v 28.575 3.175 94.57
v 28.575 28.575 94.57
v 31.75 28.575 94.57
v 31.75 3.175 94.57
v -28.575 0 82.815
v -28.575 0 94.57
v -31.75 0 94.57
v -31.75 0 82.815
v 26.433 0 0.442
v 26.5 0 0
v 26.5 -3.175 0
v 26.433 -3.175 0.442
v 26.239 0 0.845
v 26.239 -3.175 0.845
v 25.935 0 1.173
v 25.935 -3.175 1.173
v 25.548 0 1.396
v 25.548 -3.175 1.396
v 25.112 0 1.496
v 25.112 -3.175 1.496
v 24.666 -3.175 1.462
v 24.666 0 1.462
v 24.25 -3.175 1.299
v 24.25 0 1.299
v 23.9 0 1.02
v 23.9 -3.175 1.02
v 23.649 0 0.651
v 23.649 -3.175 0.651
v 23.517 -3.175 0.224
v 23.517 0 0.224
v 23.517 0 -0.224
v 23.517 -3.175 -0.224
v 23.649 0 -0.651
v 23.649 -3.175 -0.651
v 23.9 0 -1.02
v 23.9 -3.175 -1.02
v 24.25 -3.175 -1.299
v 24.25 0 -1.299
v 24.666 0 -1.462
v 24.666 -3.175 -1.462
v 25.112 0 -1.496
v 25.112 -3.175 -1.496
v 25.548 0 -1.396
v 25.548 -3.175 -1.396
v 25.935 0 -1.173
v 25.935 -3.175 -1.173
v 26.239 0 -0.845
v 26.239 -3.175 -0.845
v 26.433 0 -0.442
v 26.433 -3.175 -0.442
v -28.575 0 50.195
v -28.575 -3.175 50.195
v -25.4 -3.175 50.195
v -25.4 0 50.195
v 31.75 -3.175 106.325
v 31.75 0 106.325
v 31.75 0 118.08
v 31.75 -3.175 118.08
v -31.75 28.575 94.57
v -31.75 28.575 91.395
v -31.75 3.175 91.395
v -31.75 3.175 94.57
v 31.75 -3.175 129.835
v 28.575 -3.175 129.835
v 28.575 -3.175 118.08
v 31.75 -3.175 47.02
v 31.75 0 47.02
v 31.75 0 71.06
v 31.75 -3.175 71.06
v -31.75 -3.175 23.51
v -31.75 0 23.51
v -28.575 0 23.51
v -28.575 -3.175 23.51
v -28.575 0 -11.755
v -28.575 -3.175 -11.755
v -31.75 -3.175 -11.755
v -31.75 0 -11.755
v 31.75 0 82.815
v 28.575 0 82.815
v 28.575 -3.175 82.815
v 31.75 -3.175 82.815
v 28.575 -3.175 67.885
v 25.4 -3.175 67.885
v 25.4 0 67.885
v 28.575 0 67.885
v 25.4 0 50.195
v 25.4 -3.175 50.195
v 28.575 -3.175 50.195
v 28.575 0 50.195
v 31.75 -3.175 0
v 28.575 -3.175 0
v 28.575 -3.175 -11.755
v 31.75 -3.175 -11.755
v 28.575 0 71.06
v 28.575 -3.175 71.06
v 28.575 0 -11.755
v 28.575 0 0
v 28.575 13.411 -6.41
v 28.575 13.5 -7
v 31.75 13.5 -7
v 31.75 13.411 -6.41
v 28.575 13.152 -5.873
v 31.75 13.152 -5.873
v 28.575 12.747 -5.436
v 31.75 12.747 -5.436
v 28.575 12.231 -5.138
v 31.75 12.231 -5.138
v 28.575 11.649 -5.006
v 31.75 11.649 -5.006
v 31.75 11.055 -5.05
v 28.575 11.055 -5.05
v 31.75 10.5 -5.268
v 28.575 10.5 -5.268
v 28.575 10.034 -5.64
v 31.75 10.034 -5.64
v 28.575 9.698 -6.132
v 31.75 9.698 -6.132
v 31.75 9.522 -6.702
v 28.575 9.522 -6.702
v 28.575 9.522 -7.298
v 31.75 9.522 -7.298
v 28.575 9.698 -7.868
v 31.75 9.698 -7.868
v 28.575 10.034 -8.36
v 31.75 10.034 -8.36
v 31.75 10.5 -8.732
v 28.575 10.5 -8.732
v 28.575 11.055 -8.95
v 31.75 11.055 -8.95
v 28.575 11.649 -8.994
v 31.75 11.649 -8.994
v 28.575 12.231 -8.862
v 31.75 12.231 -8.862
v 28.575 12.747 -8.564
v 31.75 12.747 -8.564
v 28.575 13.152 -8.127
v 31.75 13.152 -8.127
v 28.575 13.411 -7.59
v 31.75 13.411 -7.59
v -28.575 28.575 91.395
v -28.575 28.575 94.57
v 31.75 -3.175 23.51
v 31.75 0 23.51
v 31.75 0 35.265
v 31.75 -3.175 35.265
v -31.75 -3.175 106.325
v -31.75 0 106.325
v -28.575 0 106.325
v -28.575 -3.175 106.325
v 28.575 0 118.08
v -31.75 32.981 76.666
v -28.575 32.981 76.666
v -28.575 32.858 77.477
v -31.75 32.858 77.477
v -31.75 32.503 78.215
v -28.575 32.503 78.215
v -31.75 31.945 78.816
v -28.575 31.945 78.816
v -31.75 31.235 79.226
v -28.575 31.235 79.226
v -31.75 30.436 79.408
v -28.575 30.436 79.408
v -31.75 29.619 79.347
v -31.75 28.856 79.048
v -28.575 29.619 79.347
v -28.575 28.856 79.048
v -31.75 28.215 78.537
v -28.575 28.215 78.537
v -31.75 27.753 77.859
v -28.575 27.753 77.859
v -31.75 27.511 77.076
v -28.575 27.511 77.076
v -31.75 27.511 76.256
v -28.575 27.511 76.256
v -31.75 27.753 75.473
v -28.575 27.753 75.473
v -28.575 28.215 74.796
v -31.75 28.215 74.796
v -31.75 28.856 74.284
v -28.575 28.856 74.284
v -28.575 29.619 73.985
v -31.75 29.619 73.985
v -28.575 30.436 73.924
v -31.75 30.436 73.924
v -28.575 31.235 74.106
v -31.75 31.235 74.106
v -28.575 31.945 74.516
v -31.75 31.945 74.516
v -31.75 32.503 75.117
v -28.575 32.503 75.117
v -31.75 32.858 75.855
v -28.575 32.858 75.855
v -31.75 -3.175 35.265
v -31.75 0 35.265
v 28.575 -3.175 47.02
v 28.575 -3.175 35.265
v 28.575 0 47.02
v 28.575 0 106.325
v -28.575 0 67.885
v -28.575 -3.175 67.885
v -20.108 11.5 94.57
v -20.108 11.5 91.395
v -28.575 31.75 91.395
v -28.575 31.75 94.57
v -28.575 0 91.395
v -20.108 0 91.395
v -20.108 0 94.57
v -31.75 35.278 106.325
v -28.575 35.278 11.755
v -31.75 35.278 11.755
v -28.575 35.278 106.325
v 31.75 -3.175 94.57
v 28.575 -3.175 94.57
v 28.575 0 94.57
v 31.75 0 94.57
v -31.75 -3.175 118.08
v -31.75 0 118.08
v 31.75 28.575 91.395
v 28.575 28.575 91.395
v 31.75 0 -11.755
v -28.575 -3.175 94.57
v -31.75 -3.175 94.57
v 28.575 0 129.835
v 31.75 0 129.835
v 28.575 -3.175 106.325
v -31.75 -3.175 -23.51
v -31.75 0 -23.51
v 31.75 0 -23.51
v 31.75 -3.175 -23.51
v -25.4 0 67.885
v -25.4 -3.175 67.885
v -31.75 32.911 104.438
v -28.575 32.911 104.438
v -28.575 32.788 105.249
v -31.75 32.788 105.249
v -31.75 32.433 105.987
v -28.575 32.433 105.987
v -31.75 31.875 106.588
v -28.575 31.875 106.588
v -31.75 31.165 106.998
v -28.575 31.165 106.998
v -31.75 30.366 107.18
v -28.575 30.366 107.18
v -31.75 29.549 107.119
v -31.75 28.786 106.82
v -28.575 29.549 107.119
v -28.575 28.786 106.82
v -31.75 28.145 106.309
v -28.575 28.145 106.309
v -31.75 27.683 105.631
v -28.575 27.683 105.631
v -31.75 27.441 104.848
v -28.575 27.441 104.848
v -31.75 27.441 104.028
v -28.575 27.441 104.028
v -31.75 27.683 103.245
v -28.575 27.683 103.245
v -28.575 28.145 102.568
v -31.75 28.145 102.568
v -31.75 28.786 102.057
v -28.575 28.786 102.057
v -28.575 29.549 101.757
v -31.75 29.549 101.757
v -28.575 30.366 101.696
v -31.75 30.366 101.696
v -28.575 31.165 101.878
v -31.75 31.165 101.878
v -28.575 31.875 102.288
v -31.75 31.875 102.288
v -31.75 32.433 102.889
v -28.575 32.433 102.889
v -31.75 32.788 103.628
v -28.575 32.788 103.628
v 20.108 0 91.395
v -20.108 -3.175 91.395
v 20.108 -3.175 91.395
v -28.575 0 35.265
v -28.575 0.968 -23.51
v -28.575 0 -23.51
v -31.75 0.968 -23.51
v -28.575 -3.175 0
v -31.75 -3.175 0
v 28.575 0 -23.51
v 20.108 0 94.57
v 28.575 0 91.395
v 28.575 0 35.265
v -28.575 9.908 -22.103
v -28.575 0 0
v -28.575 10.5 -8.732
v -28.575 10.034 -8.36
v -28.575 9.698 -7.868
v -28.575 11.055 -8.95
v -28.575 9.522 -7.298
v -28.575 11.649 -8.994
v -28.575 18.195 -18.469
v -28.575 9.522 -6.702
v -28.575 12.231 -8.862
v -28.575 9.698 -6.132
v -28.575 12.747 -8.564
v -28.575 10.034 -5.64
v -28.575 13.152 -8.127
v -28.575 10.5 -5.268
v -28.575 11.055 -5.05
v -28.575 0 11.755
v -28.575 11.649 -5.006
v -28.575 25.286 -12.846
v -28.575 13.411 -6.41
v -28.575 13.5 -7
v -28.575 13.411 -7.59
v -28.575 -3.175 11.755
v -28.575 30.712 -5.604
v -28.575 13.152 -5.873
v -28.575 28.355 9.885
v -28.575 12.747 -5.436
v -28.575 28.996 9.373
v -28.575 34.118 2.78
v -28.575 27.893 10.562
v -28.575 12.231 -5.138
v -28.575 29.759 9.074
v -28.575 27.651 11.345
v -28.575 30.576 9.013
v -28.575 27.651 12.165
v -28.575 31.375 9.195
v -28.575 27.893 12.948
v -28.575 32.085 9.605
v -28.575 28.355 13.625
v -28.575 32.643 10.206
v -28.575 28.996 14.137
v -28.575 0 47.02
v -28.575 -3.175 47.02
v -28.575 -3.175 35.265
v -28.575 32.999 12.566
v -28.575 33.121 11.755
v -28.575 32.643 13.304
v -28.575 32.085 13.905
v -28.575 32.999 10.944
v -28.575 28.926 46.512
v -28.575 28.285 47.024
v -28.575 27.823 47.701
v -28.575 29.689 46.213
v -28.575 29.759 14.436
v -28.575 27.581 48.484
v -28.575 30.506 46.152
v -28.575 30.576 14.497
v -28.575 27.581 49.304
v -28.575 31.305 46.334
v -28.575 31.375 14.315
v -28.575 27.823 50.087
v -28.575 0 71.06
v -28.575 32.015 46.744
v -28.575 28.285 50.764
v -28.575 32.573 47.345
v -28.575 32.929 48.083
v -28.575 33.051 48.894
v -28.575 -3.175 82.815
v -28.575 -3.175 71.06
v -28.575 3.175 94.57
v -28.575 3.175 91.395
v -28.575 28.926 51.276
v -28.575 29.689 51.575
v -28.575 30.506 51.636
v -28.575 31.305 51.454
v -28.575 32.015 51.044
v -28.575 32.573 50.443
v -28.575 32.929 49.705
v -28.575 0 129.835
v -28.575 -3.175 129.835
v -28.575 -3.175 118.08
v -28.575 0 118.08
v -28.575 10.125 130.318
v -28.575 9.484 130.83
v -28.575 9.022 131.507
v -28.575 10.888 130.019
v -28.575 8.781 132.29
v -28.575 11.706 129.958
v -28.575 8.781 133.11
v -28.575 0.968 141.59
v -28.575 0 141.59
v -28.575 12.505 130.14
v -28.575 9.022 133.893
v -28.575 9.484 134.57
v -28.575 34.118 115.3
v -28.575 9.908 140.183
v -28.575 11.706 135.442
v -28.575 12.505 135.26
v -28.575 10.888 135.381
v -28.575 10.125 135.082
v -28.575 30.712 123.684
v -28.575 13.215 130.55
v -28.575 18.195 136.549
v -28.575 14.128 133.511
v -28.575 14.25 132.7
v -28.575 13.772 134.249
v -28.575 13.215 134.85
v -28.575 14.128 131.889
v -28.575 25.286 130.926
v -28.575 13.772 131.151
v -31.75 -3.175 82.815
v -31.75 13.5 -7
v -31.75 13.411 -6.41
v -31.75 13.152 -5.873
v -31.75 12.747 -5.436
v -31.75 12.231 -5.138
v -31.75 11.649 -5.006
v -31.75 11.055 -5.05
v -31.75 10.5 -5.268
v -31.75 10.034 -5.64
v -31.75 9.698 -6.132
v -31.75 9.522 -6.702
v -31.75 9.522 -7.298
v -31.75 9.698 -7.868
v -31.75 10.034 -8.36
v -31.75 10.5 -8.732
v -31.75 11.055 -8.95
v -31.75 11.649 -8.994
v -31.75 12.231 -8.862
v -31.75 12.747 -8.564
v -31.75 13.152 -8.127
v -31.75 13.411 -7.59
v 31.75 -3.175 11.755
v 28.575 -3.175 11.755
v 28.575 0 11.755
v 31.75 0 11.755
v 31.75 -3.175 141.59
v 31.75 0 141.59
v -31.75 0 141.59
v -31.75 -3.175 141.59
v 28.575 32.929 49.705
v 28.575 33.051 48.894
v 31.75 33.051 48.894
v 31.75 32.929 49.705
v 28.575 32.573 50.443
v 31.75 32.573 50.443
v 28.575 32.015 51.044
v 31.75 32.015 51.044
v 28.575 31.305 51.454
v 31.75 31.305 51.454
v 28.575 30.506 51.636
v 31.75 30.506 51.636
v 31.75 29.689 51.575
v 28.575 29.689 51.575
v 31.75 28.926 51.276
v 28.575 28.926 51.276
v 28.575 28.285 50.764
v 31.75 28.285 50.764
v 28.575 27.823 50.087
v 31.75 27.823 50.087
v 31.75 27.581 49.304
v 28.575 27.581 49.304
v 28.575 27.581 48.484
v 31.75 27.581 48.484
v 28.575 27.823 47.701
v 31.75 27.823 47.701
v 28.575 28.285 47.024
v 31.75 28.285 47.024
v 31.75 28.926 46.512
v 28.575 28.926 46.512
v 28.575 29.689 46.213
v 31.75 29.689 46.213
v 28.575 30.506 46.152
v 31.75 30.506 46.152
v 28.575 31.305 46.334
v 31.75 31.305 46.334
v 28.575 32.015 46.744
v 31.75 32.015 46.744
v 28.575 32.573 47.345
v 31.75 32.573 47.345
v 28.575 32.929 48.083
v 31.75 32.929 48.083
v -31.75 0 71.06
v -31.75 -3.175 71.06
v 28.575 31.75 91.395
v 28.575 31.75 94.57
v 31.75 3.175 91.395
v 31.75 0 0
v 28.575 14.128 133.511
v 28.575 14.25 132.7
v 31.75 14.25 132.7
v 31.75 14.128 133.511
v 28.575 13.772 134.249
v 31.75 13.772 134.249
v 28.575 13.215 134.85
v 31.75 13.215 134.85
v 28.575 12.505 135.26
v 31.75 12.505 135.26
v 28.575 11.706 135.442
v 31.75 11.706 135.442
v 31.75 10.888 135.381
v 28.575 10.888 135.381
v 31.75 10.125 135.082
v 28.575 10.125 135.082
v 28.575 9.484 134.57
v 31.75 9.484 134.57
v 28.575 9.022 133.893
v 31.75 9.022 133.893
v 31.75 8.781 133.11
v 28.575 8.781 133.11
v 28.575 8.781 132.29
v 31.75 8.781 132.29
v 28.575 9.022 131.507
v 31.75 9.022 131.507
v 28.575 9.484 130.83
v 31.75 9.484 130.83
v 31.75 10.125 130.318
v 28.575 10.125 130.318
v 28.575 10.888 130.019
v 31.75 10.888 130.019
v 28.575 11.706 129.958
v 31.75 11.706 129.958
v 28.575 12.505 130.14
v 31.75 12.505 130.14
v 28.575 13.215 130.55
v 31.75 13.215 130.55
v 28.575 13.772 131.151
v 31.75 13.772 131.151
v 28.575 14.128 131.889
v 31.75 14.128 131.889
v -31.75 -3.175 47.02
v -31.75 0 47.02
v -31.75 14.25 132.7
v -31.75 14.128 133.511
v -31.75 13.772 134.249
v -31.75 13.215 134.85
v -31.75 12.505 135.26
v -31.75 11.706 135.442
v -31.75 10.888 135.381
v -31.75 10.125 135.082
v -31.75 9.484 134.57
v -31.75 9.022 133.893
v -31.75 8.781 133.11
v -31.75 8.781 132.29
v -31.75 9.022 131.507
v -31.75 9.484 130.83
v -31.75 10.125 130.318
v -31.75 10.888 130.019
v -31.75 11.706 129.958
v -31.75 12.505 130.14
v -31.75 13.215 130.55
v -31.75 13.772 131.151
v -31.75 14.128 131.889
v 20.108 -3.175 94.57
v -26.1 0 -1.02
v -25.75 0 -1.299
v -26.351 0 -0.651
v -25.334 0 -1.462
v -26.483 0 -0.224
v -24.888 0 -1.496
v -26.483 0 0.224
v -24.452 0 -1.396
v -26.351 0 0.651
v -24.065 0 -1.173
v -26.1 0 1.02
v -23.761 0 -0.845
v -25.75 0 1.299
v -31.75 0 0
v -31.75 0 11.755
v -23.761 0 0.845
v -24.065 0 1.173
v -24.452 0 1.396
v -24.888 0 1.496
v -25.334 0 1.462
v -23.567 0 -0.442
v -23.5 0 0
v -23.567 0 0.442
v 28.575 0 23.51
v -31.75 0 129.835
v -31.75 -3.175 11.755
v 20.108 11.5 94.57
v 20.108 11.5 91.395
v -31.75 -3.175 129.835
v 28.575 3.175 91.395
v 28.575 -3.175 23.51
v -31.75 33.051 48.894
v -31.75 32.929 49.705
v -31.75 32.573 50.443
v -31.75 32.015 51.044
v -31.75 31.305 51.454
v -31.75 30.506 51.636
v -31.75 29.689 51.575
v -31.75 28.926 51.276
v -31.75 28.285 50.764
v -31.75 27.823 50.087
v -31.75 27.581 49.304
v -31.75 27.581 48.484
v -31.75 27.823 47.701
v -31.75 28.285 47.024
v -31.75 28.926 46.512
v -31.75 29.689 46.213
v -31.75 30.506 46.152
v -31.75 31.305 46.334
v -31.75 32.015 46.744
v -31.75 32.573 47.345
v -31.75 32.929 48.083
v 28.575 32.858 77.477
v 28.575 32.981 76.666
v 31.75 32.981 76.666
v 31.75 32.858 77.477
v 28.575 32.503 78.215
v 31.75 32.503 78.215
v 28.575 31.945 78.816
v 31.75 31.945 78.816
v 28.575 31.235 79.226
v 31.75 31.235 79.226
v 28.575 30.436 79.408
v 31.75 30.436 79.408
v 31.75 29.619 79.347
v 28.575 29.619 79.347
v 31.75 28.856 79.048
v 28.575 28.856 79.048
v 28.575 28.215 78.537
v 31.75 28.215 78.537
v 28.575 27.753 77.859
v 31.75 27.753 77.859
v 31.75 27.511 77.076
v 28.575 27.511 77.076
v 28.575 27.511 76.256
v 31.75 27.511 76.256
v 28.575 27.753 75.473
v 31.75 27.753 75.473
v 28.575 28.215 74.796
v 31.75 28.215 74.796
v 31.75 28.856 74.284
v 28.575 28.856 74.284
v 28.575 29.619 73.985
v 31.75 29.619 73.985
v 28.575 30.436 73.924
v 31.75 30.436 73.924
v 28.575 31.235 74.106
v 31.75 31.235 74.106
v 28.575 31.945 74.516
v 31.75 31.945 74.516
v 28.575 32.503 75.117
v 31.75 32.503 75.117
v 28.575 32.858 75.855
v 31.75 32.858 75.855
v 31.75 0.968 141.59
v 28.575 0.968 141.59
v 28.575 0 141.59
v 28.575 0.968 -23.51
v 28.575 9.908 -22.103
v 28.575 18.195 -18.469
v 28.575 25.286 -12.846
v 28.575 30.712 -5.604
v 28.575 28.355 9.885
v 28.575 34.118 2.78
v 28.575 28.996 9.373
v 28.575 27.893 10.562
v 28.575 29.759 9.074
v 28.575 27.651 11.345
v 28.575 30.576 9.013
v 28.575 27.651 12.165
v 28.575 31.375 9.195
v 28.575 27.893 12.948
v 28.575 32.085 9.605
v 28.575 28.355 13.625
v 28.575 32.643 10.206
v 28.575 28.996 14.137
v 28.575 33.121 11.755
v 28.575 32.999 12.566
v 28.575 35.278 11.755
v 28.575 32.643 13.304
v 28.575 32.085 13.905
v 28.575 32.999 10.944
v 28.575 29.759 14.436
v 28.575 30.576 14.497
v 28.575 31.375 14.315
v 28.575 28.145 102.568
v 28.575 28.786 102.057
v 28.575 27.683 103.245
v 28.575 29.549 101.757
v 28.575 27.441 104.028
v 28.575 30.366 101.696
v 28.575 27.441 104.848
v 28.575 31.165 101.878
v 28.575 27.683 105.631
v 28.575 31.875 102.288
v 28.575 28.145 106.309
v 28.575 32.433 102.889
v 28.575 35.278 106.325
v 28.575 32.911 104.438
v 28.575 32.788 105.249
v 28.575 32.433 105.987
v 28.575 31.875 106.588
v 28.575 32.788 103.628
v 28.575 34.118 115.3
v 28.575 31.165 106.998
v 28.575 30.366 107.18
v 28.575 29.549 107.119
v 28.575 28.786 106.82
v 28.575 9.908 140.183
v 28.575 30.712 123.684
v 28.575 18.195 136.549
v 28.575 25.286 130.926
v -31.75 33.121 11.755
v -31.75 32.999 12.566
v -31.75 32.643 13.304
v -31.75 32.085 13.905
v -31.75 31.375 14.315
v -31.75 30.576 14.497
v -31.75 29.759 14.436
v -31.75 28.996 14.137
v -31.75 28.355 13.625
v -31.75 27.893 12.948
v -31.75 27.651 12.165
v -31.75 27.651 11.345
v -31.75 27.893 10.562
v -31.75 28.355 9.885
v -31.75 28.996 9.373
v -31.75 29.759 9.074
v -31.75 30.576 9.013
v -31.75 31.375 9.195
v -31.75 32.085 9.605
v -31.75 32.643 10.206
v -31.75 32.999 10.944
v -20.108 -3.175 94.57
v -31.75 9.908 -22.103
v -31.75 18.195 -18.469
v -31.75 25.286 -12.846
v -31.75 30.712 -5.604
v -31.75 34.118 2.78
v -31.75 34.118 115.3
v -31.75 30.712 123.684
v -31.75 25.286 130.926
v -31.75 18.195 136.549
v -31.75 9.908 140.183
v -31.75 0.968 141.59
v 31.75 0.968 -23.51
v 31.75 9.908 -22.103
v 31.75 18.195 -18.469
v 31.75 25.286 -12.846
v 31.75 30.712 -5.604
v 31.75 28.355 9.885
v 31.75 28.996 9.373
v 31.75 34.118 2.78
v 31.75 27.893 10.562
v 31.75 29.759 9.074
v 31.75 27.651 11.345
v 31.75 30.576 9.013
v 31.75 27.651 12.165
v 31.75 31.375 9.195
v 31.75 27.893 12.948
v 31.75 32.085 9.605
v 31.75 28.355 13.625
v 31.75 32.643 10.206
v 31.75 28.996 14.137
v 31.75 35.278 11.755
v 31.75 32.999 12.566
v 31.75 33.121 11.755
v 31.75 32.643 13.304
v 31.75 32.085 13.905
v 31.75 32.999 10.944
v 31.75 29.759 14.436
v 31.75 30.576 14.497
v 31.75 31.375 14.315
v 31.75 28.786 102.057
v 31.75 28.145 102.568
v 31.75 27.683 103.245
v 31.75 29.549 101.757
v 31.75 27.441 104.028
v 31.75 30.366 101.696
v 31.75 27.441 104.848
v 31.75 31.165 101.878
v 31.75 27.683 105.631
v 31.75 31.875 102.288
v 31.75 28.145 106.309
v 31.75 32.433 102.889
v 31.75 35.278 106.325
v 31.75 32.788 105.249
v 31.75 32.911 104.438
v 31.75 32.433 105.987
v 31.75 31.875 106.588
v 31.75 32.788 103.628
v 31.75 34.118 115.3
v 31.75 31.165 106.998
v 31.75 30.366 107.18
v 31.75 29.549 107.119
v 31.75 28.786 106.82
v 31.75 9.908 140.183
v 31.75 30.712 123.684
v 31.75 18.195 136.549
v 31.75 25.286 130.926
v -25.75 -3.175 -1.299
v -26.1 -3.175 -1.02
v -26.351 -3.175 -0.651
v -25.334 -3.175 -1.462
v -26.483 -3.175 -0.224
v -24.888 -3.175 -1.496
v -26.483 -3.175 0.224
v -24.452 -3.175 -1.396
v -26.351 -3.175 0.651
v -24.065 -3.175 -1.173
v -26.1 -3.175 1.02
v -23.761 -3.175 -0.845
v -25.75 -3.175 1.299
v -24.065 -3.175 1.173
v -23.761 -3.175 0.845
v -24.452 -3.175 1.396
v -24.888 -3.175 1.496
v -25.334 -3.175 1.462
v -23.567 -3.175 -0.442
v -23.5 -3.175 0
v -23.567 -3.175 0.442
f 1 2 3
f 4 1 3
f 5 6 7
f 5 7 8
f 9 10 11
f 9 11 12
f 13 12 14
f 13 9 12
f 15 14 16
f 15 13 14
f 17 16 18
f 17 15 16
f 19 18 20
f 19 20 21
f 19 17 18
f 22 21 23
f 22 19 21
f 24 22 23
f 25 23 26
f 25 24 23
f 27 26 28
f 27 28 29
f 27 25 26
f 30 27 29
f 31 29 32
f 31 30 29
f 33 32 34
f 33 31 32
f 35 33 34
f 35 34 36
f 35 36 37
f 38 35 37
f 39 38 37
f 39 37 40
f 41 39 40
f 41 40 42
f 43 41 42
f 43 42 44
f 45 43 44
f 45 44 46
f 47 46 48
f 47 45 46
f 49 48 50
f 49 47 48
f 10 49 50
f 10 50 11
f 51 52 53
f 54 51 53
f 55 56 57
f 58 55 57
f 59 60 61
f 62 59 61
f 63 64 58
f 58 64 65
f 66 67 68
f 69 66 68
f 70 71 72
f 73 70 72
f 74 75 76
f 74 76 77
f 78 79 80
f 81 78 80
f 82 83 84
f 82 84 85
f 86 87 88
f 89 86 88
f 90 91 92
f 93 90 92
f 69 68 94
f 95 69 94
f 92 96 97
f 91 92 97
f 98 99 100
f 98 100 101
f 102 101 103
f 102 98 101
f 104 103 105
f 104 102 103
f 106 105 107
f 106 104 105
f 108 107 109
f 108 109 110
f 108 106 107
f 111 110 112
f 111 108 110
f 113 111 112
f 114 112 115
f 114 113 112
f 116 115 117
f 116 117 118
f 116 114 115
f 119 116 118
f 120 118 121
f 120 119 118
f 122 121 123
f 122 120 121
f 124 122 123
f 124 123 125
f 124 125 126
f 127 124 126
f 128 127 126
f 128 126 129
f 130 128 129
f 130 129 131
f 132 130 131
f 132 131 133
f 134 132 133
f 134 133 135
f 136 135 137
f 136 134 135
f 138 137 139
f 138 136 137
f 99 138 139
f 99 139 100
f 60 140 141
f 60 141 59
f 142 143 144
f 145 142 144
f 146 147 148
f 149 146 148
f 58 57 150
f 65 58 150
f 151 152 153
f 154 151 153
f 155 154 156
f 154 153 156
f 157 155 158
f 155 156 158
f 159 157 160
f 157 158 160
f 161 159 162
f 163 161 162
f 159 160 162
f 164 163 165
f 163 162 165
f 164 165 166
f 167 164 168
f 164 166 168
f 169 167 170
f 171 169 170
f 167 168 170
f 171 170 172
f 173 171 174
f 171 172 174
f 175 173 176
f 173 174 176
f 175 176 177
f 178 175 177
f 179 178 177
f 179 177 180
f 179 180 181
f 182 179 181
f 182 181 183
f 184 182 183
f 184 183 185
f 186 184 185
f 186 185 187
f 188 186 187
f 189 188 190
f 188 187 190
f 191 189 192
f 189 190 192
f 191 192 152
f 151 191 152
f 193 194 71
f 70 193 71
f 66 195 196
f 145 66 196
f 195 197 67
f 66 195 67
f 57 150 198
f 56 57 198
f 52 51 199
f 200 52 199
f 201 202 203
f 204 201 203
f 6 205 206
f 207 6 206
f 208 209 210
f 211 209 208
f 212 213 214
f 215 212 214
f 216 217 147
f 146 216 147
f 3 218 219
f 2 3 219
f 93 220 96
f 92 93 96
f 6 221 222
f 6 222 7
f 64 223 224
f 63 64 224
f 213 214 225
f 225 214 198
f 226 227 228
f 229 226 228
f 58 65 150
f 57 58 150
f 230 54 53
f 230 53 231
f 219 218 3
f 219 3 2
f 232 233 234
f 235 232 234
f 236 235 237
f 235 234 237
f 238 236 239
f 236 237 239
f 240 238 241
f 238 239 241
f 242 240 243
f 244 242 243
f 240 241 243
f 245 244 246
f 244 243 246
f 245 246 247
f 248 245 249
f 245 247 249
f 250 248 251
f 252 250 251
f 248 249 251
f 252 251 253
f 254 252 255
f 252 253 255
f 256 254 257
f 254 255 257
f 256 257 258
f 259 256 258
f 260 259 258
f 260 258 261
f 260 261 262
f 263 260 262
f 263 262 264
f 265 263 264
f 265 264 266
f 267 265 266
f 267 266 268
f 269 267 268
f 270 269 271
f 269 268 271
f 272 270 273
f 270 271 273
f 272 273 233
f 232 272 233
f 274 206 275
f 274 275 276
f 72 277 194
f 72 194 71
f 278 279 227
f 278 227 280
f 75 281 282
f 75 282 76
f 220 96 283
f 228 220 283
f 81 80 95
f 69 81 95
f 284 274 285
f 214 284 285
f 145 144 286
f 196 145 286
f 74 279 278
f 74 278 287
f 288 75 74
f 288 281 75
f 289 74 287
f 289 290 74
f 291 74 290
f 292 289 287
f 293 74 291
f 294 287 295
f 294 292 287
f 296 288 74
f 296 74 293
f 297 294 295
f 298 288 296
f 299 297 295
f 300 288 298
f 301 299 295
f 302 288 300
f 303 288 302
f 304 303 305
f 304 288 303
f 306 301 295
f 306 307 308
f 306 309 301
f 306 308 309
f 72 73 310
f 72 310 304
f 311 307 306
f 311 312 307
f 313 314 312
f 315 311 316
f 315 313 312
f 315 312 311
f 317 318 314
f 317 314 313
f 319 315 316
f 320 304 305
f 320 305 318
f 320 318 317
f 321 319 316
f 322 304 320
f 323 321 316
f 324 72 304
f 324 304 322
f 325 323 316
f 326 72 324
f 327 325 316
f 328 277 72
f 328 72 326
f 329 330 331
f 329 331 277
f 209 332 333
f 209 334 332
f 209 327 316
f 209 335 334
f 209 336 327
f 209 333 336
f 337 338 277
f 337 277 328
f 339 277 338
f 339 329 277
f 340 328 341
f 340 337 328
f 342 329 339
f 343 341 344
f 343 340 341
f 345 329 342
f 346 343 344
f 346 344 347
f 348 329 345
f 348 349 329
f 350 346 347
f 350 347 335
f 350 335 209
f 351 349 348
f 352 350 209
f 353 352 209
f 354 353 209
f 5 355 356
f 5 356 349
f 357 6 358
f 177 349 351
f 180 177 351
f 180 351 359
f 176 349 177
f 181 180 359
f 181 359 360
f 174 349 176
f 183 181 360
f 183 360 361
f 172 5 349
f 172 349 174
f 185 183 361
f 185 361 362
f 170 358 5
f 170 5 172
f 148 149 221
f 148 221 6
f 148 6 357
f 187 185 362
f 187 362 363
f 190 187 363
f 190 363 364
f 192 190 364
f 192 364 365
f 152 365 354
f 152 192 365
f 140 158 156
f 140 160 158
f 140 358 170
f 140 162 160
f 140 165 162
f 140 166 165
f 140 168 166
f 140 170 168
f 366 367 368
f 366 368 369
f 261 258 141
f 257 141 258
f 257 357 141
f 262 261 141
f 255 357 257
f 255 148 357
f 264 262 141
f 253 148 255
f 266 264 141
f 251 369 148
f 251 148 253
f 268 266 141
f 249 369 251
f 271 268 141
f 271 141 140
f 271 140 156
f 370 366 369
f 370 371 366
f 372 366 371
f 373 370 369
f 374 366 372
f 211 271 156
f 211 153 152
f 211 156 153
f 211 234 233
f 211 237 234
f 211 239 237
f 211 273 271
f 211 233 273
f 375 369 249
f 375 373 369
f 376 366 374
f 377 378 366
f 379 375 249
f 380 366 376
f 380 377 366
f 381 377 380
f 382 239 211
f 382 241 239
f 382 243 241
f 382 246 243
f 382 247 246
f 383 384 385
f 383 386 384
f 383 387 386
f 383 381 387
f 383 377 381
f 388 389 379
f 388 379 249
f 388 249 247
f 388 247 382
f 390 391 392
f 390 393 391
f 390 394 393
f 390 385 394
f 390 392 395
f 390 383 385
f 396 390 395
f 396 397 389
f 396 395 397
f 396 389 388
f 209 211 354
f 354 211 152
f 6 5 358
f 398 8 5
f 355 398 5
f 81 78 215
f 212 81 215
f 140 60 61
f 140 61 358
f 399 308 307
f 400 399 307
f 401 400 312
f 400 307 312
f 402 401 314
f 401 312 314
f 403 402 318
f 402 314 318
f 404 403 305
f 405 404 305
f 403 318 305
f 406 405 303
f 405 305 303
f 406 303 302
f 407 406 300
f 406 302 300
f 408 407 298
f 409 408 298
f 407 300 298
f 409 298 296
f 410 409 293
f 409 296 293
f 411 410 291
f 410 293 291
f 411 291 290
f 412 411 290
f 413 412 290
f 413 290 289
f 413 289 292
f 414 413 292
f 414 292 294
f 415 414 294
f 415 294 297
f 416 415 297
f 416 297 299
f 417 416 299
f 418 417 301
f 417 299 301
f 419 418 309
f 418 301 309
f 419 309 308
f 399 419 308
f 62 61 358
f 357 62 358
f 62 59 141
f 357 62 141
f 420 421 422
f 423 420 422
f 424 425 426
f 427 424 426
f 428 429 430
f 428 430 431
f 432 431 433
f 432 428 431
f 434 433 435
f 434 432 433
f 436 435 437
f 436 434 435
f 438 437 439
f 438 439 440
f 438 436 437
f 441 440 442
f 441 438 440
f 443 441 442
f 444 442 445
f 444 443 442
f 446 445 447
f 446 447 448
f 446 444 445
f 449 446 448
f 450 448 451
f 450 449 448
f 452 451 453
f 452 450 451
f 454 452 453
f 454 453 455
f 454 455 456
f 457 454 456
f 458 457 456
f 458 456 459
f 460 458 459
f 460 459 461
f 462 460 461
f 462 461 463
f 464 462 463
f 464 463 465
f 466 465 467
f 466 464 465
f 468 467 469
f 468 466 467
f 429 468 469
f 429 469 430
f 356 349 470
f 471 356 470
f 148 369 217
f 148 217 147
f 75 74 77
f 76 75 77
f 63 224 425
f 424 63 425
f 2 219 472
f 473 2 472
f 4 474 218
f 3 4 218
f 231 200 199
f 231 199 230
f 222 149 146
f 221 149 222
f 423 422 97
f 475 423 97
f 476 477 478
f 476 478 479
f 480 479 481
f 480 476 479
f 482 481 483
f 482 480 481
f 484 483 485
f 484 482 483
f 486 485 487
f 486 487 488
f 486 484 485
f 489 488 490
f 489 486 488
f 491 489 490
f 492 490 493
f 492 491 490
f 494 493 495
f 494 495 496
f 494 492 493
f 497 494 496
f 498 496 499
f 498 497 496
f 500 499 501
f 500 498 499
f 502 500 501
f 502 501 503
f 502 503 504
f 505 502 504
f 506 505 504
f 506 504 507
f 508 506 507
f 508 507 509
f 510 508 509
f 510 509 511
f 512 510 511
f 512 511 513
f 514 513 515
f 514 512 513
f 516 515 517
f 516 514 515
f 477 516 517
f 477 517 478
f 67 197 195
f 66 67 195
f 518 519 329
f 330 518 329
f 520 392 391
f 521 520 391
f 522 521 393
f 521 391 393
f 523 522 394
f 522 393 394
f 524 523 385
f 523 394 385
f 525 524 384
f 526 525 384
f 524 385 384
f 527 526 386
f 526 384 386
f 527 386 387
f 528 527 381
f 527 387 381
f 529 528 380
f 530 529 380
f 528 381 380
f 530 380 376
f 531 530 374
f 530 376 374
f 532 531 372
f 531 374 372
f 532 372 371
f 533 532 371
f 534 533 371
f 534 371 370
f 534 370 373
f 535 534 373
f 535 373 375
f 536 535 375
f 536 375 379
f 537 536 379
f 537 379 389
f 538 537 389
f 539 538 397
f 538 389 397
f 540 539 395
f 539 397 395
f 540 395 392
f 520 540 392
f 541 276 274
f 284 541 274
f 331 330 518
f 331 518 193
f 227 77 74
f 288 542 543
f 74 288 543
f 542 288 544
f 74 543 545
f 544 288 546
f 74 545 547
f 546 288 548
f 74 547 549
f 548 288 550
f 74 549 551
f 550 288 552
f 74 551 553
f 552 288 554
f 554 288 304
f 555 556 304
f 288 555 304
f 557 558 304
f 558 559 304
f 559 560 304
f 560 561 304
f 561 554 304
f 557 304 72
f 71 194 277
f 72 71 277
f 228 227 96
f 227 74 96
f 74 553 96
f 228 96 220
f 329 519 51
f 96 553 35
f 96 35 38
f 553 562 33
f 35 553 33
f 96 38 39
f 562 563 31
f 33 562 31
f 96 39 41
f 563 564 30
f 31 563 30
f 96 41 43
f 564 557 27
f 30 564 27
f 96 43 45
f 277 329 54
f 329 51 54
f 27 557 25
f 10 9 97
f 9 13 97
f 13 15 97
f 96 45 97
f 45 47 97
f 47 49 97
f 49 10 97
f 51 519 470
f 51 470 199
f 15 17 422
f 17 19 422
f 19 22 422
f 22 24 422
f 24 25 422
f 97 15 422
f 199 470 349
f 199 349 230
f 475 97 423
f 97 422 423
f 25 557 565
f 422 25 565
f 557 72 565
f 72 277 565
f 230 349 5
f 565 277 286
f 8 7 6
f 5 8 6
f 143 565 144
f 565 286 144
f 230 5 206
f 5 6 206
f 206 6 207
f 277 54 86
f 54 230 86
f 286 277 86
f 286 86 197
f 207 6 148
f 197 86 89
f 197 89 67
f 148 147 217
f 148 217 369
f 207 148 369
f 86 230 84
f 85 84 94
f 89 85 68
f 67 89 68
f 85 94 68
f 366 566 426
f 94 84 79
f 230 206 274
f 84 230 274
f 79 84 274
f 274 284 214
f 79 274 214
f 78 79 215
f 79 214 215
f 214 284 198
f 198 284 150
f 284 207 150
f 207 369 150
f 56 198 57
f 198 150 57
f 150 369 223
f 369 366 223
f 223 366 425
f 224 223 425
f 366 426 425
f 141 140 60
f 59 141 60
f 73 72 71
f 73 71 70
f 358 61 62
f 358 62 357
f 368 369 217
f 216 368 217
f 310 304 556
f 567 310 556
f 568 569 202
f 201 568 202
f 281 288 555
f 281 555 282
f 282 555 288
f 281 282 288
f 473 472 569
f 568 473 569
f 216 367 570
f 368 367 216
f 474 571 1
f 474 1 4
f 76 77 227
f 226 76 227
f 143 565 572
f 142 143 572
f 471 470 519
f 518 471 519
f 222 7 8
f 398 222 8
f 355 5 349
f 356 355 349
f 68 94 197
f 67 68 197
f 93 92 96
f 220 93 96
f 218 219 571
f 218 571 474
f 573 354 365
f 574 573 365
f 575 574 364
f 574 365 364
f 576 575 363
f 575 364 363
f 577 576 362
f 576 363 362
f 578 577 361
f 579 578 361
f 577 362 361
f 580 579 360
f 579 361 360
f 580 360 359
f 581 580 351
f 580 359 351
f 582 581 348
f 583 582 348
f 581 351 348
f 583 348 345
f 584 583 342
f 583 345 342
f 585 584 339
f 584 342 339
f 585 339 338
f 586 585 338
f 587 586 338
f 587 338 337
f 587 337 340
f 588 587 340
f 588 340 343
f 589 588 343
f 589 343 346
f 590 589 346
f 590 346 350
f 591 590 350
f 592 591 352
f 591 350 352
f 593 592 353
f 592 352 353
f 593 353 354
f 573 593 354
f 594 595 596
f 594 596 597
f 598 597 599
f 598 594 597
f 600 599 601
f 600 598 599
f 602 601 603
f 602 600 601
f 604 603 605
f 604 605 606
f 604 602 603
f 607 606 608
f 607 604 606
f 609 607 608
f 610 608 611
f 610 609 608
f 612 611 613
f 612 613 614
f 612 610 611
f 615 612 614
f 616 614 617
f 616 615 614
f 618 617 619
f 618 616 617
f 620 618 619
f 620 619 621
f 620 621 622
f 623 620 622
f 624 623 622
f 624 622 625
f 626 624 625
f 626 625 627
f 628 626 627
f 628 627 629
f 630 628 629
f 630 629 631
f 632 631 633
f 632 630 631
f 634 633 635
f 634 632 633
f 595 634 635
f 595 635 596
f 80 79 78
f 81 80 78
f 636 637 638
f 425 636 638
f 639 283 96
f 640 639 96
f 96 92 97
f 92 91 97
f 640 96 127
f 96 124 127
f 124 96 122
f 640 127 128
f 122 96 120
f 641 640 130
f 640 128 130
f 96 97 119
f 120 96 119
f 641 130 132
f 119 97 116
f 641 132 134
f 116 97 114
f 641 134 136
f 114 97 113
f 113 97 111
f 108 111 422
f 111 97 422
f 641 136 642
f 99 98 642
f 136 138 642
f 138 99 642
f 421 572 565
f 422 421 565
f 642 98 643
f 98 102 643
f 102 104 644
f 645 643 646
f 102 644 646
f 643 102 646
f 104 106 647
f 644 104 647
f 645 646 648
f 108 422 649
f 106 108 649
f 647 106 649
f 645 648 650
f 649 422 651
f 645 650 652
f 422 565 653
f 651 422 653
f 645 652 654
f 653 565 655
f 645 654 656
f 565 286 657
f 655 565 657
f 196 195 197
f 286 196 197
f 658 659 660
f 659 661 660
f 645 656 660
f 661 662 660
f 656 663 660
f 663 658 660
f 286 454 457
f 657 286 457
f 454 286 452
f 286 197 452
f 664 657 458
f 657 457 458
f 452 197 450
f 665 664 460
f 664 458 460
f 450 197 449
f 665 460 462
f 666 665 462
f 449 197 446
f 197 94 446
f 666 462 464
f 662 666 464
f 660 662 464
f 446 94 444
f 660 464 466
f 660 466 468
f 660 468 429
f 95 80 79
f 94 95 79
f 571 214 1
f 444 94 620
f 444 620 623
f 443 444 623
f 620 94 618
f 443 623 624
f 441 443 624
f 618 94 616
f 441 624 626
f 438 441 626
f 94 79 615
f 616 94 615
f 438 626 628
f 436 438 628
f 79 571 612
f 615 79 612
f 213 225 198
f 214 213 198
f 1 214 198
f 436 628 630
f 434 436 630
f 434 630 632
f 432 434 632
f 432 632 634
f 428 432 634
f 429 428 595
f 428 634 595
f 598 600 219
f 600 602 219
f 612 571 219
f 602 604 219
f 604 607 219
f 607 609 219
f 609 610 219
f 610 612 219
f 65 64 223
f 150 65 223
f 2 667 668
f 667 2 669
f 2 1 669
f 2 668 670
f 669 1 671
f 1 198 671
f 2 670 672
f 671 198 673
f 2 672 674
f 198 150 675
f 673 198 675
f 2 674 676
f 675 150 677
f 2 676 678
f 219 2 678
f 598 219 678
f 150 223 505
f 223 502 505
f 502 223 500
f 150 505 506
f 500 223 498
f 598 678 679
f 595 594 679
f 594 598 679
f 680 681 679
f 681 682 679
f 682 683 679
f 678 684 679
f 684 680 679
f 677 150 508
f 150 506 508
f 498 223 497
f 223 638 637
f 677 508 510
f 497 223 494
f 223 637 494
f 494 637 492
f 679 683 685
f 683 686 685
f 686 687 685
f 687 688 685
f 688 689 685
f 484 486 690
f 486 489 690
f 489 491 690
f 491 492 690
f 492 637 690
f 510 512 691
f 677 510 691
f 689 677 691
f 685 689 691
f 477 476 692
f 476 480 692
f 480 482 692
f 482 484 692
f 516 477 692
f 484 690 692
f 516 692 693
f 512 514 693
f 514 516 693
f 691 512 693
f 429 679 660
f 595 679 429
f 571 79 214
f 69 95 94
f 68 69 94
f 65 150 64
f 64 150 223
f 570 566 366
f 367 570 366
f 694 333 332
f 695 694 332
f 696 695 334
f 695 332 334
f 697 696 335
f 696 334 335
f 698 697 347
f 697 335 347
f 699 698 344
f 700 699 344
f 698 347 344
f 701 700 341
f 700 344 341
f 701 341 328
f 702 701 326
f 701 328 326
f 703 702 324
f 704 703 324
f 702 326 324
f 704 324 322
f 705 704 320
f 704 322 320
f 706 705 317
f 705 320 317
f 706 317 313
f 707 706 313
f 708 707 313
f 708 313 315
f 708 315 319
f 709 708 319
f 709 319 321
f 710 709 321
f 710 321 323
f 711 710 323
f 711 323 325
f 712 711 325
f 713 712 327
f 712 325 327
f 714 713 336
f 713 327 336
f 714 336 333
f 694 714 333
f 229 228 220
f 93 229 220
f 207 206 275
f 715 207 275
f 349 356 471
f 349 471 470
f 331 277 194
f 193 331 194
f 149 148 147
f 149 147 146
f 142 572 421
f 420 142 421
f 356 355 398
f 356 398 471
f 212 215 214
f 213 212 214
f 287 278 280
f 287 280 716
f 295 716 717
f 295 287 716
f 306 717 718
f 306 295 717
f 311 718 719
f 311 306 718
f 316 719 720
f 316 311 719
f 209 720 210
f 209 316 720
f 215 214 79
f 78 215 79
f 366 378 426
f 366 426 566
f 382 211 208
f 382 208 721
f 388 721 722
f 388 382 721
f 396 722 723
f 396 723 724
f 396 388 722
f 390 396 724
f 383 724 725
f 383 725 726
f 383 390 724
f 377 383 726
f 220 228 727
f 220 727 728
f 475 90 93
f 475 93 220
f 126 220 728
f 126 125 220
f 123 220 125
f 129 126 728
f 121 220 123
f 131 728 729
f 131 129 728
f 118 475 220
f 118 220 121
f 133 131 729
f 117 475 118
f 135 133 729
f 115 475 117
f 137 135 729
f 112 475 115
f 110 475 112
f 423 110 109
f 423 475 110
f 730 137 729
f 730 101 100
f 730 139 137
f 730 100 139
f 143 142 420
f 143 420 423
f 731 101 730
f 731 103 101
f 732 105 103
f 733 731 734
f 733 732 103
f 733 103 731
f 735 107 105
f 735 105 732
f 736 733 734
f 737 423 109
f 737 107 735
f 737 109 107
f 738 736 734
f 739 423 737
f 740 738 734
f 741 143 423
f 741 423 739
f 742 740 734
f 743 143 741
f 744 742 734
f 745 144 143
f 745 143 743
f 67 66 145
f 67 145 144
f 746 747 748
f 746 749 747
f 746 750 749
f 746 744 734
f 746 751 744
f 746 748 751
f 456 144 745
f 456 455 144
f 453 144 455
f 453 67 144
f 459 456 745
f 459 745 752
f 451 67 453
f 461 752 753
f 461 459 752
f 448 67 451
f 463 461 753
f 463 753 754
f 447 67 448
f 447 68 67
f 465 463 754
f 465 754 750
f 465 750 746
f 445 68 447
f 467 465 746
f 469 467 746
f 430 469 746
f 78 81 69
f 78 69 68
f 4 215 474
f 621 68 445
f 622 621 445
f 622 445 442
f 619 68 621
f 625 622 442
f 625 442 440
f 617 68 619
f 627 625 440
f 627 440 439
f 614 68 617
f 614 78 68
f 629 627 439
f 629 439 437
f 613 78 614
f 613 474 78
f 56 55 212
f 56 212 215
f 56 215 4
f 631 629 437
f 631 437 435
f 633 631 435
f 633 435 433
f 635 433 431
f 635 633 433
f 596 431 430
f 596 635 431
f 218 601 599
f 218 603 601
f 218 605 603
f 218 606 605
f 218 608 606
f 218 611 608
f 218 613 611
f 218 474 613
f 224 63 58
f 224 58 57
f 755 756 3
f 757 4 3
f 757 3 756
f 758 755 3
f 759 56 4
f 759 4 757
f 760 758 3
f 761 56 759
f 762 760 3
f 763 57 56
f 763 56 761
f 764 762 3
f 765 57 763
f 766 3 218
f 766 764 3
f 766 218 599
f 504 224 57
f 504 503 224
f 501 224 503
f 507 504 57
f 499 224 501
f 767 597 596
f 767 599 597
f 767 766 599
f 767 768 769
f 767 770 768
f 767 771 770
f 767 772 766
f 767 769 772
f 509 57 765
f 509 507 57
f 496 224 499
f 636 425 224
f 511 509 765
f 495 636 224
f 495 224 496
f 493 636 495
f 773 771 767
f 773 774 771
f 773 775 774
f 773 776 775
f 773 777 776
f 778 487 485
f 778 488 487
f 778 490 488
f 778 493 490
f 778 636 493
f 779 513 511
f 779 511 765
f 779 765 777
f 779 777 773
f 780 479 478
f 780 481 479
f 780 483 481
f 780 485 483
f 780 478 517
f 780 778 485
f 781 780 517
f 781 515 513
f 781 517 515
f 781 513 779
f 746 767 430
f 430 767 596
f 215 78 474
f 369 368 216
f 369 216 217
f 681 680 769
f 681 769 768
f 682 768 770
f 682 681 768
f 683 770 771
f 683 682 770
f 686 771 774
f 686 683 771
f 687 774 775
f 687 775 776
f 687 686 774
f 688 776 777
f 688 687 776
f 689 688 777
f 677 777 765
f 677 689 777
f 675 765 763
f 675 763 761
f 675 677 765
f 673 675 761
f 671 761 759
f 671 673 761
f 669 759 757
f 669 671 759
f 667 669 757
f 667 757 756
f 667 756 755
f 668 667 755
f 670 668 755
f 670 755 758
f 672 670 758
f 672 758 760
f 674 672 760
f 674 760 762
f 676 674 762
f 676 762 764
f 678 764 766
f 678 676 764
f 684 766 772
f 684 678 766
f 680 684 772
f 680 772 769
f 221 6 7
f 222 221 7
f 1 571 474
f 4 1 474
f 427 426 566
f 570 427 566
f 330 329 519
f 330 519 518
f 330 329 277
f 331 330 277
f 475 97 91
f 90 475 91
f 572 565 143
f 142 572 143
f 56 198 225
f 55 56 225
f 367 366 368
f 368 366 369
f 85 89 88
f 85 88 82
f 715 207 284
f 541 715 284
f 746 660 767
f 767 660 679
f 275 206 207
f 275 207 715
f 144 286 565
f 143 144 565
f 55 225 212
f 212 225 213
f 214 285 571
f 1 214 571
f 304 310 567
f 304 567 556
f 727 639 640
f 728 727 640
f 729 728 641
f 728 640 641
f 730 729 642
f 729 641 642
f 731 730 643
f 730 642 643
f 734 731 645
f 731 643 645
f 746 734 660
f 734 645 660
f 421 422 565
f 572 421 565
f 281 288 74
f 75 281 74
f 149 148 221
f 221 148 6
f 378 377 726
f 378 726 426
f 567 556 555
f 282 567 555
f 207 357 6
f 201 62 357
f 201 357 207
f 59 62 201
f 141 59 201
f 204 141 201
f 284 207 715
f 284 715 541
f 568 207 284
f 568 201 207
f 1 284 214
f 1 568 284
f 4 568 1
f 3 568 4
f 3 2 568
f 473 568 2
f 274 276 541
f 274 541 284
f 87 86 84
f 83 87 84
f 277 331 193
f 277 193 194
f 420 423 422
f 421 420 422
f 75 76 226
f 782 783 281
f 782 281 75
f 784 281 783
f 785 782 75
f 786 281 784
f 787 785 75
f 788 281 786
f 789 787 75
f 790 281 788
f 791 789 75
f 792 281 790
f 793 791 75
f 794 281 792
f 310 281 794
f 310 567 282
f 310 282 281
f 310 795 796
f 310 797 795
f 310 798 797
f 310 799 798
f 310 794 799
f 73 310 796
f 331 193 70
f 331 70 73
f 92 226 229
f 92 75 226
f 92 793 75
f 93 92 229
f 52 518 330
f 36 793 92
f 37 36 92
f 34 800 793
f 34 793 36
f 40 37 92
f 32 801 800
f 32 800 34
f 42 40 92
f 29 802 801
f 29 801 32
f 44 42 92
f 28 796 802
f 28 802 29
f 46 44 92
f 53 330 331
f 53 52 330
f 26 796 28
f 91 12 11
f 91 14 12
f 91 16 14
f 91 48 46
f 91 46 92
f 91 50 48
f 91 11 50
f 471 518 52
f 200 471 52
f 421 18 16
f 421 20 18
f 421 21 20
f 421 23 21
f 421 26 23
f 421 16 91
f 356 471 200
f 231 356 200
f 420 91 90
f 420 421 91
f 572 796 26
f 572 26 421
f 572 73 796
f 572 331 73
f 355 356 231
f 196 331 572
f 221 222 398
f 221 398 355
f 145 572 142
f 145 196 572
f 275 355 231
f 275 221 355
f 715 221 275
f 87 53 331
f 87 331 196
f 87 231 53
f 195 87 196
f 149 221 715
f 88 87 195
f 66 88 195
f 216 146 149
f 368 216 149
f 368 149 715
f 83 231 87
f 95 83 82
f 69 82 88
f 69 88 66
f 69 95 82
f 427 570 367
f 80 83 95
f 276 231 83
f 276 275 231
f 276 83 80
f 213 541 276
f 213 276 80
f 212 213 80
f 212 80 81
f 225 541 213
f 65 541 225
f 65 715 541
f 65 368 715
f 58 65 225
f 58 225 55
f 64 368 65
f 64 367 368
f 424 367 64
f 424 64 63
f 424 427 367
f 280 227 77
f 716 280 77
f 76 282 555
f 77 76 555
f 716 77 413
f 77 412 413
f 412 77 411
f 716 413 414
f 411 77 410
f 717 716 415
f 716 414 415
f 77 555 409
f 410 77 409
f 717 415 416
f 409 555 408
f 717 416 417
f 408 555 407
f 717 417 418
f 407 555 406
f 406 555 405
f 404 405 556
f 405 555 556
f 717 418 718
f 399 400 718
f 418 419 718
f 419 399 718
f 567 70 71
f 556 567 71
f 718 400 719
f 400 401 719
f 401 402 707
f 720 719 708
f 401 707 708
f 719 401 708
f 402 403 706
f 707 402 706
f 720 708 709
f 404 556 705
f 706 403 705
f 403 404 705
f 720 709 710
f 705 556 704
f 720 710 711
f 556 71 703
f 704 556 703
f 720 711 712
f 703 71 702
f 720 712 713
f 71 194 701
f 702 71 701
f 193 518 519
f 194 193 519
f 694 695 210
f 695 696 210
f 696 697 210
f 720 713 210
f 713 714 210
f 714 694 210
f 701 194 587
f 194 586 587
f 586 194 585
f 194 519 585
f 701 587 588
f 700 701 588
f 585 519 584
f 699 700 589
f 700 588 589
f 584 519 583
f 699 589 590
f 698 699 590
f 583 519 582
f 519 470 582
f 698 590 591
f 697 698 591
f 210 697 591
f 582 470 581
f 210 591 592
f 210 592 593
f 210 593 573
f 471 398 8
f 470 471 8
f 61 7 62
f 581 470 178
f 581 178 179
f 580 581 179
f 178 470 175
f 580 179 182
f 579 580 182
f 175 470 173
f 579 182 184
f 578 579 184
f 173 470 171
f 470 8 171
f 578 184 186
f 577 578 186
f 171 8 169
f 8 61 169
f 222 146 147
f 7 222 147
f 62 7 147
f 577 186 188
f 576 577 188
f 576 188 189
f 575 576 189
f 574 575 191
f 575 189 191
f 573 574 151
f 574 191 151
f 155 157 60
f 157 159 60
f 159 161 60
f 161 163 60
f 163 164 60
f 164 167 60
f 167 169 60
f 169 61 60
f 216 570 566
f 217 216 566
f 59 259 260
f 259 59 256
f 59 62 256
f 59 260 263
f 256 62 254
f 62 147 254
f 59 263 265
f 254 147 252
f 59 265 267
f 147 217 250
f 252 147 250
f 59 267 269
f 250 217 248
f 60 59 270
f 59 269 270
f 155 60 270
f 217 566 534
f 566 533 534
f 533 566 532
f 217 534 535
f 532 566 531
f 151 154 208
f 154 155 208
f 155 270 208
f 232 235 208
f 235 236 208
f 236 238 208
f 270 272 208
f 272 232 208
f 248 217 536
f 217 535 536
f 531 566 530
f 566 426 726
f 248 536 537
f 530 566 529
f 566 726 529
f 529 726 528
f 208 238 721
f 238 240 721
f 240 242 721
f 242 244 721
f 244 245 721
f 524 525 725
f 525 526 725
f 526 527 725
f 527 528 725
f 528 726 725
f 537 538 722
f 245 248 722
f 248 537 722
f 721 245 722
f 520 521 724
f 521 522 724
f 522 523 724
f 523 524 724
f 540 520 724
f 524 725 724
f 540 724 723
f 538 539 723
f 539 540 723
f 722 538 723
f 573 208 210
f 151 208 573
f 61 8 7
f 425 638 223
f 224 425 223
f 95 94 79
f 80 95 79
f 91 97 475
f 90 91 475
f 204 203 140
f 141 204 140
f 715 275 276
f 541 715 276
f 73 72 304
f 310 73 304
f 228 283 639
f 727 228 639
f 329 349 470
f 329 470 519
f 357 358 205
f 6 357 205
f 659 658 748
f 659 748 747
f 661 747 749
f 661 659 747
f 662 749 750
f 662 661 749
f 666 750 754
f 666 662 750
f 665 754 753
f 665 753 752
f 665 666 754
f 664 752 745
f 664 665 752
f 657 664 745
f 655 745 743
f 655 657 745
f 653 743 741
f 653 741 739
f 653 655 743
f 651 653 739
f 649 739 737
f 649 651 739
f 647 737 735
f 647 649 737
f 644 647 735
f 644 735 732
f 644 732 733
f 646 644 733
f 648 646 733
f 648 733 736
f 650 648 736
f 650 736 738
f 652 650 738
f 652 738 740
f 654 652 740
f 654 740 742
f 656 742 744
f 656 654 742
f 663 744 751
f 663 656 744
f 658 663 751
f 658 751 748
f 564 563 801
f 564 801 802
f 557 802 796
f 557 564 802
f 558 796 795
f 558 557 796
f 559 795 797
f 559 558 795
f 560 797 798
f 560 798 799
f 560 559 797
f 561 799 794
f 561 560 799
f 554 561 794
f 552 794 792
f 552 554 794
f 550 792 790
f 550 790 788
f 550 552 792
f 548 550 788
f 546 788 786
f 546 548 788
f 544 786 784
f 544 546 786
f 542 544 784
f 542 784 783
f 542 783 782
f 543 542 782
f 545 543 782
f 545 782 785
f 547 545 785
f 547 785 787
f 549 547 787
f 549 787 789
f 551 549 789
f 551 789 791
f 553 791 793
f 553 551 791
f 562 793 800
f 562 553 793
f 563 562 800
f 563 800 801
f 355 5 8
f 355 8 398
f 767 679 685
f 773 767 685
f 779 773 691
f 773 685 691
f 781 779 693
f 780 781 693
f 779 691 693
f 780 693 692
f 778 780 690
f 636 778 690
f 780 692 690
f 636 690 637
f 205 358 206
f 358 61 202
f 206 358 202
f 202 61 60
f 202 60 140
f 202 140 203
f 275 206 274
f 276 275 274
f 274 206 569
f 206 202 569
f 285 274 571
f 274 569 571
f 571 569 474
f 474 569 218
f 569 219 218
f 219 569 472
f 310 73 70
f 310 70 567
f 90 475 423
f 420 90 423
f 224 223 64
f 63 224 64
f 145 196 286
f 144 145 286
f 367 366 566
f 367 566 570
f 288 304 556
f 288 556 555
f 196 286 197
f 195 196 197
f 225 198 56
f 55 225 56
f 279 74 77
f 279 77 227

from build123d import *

# Parameters (mm, degrees)
F3_R      = 1.5
F3_W      = 3.175
F3_H      = 17.69
F4_DEPTH  = 3.175
F6_START  = 28.575
F5_R      = 2
F5_R_2    = 2.75
F6_DEPTH  = 3.175
F9_START  = 91.395
F9_DEPTH  = 3.175
F10_START = 91.395
F10_DEPTH = 3.175


# Not quite as in the source:
# - a variable given as a bare number and used for a length is read in inches; the dataset says mm whatever the document's units were


with BuildPart() as f4:
    # F3 (on Front) → F4 (new body)
    with BuildSketch(Plane.XZ):
        Polygon((-31.75, -23.51), (0, -23.51), (31.75, -23.51), (31.75, -11.755), (28.575, -11.755), (28.575, 0), (31.75, 0), (31.75, 11.755), (28.575, 11.755), (28.575, 23.51), (31.75, 23.51), (31.75, 35.265), (28.575, 35.265), (28.575, 47.02), (31.75, 47.02), (31.75, 59.04), (31.75, 71.06), (28.575, 71.06), (28.575, 82.815), (31.75, 82.815), (31.75, 94.57), (28.575, 94.57), (28.575, 106.325), (31.75, 106.325), (31.75, 118.08), (28.575, 118.08), (28.575, 129.835), (31.75, 129.835), (31.75, 141.59), (0, 141.59), (-31.75, 141.59), (-31.75, 129.835), (-28.575, 129.835), (-28.575, 118.08), (-31.75, 118.08), (-31.75, 106.325), (-28.575, 106.325), (-28.575, 94.57), (-31.75, 94.57), (-31.75, 82.815), (-28.575, 82.815), (-28.575, 71.06), (-31.75, 71.06), (-31.75, 59.04), (-31.75, 47.02), (-28.575, 47.02), (-28.575, 35.265), (-31.75, 35.265), (-31.75, 23.51), (-28.575, 23.51), (-28.575, 11.755), (-31.75, 11.755), (-31.75, 0), (-28.575, 0), (-28.575, -11.755), (-31.75, -11.755), align=None)
        with Locations((-25, 0)):
            Circle(F3_R, mode=Mode.SUBTRACT)
        with Locations((-26.9875, 59.04)):
            Rectangle(F3_W, F3_H, mode=Mode.SUBTRACT)
        with Locations((25, 0)):
            Circle(F3_R, mode=Mode.SUBTRACT)
        with Locations((26.9875, 59.04)):
            Rectangle(F3_W, F3_H, mode=Mode.SUBTRACT)
    extrude(amount=F4_DEPTH)


with BuildPart() as f6:
    # F5 (on Right) → F6 (new body)
    with BuildSketch(Plane.YZ.offset(F6_START)):
        with BuildLine():
            Line((0, -11.755), (0, -23.51))
            Line((0, -23.51), (0.9683232056, -23.51))
            ThreePointArc((0.9683232056, -23.51), (25.2855557925, -12.8457833838), (35.2782918355, 11.755))
            Line((35.2782918355, 11.755), (35.2782918355, 106.325))
            ThreePointArc((35.2782918355, 106.325), (25.2855557925, 130.9257833838), (0.9683232056, 141.59))
            Line((0.9683232056, 141.59), (0, 141.59))
            Line((0, 141.59), (0, 129.835))
            Line((0, 129.835), (-3.175, 129.835))
            Line((-3.175, 129.835), (-3.175, 118.08))
            Line((-3.175, 118.08), (0, 118.08))
            Line((0, 118.08), (0, 106.325))
            Line((0, 106.325), (-3.175, 106.325))
            Line((-3.175, 106.325), (-3.175, 94.57))
            Line((-3.175, 94.57), (0, 94.57))
            Line((0, 94.57), (0, 82.815))
            Line((0, 82.815), (-3.175, 82.815))
            Line((-3.175, 82.815), (-3.175, 71.06))
            Line((-3.175, 71.06), (0, 71.06))
            Line((0, 71.06), (0, 59.04))
            Line((0, 59.04), (0, 47.02))
            Line((0, 47.02), (-3.175, 47.02))
            Line((-3.175, 47.02), (-3.175, 35.265))
            Line((-3.175, 35.265), (0, 35.265))
            Line((0, 35.265), (0, 23.51))
            Line((0, 23.51), (-3.175, 23.51))
            Line((-3.175, 23.51), (-3.175, 11.755))
            Line((-3.175, 11.755), (0, 11.755))
            Line((0, 11.755), (0, 0))
            Line((0, 0), (-3.175, 0))
            Line((-3.175, 0), (-3.175, -11.755))
            Line((-3.175, -11.755), (0, -11.755))
        make_face()
        with Locations((11.5, -7)):
            Circle(F5_R, mode=Mode.SUBTRACT)
        with Locations((30.370771822, 11.755)):
            Circle(F5_R_2, mode=Mode.SUBTRACT)
        with Locations((30.3006969122, 48.8940113736)):
            Circle(F5_R_2, mode=Mode.SUBTRACT)
        with Locations((11.5, 132.7)):
            Circle(F5_R_2, mode=Mode.SUBTRACT)
        with Locations((30.2306220023, 76.6660547871)):
            Circle(F5_R_2, mode=Mode.SUBTRACT)
        with Locations((30.1605470924, 104.4380982005)):
            Circle(F5_R_2, mode=Mode.SUBTRACT)
    extrude(amount=F6_DEPTH)


with BuildPart() as f7_1:
    # F7: instance of F6
    add(f6.part.mirror(Plane.YZ))


with BuildPart() as f9_tool:
    # F8 (on Top) → F9 (new body)
    with BuildSketch(Plane.XY.offset(F9_START)):
        Polygon((20.1083333333, 11.5), (0, 11.5), (-20.1083333333, 11.5), (-28.575, 31.75), (-28.575, 28.575), (-31.75, 28.575), (-31.75, 3.175), (-28.575, 3.175), (-28.575, 0), (-20.1083333333, 0), (-20.1083333333, -3.175), (0, -3.175), (20.1083333333, -3.175), (20.1083333333, 0), (28.575, 0), (28.575, 3.175), (31.75, 3.175), (31.75, 28.575), (28.575, 28.575), (28.575, 31.75), align=None)
    extrude(amount=F9_DEPTH)


with BuildPart() as f4_1:
    add(f4.part)

    # F9: cut by f9_tool
    add(f9_tool.part, mode=Mode.SUBTRACT)


with BuildPart() as f6_1:
    add(f6.part)

    # F9: cut by f9_tool
    add(f9_tool.part, mode=Mode.SUBTRACT)


with BuildPart() as f7_1_1:
    add(f7_1.part)

    # F9: cut by f9_tool
    add(f9_tool.part, mode=Mode.SUBTRACT)


with BuildPart() as f10:
    # F8 (on Top) → F10 (new body)
    with BuildSketch(Plane.XY.offset(F10_START)):
        Polygon((20.1083333333, 11.5), (0, 11.5), (-20.1083333333, 11.5), (-28.575, 31.75), (-28.575, 28.575), (-31.75, 28.575), (-31.75, 3.175), (-28.575, 3.175), (-28.575, 0), (-20.1083333333, 0), (-20.1083333333, -3.175), (0, -3.175), (20.1083333333, -3.175), (20.1083333333, 0), (28.575, 0), (28.575, 3.175), (31.75, 3.175), (31.75, 28.575), (28.575, 28.575), (28.575, 31.75), align=None)
    extrude(amount=F10_DEPTH)


solid = Compound([f4_1.part, f6_1.part, f7_1_1.part, f10.part])
